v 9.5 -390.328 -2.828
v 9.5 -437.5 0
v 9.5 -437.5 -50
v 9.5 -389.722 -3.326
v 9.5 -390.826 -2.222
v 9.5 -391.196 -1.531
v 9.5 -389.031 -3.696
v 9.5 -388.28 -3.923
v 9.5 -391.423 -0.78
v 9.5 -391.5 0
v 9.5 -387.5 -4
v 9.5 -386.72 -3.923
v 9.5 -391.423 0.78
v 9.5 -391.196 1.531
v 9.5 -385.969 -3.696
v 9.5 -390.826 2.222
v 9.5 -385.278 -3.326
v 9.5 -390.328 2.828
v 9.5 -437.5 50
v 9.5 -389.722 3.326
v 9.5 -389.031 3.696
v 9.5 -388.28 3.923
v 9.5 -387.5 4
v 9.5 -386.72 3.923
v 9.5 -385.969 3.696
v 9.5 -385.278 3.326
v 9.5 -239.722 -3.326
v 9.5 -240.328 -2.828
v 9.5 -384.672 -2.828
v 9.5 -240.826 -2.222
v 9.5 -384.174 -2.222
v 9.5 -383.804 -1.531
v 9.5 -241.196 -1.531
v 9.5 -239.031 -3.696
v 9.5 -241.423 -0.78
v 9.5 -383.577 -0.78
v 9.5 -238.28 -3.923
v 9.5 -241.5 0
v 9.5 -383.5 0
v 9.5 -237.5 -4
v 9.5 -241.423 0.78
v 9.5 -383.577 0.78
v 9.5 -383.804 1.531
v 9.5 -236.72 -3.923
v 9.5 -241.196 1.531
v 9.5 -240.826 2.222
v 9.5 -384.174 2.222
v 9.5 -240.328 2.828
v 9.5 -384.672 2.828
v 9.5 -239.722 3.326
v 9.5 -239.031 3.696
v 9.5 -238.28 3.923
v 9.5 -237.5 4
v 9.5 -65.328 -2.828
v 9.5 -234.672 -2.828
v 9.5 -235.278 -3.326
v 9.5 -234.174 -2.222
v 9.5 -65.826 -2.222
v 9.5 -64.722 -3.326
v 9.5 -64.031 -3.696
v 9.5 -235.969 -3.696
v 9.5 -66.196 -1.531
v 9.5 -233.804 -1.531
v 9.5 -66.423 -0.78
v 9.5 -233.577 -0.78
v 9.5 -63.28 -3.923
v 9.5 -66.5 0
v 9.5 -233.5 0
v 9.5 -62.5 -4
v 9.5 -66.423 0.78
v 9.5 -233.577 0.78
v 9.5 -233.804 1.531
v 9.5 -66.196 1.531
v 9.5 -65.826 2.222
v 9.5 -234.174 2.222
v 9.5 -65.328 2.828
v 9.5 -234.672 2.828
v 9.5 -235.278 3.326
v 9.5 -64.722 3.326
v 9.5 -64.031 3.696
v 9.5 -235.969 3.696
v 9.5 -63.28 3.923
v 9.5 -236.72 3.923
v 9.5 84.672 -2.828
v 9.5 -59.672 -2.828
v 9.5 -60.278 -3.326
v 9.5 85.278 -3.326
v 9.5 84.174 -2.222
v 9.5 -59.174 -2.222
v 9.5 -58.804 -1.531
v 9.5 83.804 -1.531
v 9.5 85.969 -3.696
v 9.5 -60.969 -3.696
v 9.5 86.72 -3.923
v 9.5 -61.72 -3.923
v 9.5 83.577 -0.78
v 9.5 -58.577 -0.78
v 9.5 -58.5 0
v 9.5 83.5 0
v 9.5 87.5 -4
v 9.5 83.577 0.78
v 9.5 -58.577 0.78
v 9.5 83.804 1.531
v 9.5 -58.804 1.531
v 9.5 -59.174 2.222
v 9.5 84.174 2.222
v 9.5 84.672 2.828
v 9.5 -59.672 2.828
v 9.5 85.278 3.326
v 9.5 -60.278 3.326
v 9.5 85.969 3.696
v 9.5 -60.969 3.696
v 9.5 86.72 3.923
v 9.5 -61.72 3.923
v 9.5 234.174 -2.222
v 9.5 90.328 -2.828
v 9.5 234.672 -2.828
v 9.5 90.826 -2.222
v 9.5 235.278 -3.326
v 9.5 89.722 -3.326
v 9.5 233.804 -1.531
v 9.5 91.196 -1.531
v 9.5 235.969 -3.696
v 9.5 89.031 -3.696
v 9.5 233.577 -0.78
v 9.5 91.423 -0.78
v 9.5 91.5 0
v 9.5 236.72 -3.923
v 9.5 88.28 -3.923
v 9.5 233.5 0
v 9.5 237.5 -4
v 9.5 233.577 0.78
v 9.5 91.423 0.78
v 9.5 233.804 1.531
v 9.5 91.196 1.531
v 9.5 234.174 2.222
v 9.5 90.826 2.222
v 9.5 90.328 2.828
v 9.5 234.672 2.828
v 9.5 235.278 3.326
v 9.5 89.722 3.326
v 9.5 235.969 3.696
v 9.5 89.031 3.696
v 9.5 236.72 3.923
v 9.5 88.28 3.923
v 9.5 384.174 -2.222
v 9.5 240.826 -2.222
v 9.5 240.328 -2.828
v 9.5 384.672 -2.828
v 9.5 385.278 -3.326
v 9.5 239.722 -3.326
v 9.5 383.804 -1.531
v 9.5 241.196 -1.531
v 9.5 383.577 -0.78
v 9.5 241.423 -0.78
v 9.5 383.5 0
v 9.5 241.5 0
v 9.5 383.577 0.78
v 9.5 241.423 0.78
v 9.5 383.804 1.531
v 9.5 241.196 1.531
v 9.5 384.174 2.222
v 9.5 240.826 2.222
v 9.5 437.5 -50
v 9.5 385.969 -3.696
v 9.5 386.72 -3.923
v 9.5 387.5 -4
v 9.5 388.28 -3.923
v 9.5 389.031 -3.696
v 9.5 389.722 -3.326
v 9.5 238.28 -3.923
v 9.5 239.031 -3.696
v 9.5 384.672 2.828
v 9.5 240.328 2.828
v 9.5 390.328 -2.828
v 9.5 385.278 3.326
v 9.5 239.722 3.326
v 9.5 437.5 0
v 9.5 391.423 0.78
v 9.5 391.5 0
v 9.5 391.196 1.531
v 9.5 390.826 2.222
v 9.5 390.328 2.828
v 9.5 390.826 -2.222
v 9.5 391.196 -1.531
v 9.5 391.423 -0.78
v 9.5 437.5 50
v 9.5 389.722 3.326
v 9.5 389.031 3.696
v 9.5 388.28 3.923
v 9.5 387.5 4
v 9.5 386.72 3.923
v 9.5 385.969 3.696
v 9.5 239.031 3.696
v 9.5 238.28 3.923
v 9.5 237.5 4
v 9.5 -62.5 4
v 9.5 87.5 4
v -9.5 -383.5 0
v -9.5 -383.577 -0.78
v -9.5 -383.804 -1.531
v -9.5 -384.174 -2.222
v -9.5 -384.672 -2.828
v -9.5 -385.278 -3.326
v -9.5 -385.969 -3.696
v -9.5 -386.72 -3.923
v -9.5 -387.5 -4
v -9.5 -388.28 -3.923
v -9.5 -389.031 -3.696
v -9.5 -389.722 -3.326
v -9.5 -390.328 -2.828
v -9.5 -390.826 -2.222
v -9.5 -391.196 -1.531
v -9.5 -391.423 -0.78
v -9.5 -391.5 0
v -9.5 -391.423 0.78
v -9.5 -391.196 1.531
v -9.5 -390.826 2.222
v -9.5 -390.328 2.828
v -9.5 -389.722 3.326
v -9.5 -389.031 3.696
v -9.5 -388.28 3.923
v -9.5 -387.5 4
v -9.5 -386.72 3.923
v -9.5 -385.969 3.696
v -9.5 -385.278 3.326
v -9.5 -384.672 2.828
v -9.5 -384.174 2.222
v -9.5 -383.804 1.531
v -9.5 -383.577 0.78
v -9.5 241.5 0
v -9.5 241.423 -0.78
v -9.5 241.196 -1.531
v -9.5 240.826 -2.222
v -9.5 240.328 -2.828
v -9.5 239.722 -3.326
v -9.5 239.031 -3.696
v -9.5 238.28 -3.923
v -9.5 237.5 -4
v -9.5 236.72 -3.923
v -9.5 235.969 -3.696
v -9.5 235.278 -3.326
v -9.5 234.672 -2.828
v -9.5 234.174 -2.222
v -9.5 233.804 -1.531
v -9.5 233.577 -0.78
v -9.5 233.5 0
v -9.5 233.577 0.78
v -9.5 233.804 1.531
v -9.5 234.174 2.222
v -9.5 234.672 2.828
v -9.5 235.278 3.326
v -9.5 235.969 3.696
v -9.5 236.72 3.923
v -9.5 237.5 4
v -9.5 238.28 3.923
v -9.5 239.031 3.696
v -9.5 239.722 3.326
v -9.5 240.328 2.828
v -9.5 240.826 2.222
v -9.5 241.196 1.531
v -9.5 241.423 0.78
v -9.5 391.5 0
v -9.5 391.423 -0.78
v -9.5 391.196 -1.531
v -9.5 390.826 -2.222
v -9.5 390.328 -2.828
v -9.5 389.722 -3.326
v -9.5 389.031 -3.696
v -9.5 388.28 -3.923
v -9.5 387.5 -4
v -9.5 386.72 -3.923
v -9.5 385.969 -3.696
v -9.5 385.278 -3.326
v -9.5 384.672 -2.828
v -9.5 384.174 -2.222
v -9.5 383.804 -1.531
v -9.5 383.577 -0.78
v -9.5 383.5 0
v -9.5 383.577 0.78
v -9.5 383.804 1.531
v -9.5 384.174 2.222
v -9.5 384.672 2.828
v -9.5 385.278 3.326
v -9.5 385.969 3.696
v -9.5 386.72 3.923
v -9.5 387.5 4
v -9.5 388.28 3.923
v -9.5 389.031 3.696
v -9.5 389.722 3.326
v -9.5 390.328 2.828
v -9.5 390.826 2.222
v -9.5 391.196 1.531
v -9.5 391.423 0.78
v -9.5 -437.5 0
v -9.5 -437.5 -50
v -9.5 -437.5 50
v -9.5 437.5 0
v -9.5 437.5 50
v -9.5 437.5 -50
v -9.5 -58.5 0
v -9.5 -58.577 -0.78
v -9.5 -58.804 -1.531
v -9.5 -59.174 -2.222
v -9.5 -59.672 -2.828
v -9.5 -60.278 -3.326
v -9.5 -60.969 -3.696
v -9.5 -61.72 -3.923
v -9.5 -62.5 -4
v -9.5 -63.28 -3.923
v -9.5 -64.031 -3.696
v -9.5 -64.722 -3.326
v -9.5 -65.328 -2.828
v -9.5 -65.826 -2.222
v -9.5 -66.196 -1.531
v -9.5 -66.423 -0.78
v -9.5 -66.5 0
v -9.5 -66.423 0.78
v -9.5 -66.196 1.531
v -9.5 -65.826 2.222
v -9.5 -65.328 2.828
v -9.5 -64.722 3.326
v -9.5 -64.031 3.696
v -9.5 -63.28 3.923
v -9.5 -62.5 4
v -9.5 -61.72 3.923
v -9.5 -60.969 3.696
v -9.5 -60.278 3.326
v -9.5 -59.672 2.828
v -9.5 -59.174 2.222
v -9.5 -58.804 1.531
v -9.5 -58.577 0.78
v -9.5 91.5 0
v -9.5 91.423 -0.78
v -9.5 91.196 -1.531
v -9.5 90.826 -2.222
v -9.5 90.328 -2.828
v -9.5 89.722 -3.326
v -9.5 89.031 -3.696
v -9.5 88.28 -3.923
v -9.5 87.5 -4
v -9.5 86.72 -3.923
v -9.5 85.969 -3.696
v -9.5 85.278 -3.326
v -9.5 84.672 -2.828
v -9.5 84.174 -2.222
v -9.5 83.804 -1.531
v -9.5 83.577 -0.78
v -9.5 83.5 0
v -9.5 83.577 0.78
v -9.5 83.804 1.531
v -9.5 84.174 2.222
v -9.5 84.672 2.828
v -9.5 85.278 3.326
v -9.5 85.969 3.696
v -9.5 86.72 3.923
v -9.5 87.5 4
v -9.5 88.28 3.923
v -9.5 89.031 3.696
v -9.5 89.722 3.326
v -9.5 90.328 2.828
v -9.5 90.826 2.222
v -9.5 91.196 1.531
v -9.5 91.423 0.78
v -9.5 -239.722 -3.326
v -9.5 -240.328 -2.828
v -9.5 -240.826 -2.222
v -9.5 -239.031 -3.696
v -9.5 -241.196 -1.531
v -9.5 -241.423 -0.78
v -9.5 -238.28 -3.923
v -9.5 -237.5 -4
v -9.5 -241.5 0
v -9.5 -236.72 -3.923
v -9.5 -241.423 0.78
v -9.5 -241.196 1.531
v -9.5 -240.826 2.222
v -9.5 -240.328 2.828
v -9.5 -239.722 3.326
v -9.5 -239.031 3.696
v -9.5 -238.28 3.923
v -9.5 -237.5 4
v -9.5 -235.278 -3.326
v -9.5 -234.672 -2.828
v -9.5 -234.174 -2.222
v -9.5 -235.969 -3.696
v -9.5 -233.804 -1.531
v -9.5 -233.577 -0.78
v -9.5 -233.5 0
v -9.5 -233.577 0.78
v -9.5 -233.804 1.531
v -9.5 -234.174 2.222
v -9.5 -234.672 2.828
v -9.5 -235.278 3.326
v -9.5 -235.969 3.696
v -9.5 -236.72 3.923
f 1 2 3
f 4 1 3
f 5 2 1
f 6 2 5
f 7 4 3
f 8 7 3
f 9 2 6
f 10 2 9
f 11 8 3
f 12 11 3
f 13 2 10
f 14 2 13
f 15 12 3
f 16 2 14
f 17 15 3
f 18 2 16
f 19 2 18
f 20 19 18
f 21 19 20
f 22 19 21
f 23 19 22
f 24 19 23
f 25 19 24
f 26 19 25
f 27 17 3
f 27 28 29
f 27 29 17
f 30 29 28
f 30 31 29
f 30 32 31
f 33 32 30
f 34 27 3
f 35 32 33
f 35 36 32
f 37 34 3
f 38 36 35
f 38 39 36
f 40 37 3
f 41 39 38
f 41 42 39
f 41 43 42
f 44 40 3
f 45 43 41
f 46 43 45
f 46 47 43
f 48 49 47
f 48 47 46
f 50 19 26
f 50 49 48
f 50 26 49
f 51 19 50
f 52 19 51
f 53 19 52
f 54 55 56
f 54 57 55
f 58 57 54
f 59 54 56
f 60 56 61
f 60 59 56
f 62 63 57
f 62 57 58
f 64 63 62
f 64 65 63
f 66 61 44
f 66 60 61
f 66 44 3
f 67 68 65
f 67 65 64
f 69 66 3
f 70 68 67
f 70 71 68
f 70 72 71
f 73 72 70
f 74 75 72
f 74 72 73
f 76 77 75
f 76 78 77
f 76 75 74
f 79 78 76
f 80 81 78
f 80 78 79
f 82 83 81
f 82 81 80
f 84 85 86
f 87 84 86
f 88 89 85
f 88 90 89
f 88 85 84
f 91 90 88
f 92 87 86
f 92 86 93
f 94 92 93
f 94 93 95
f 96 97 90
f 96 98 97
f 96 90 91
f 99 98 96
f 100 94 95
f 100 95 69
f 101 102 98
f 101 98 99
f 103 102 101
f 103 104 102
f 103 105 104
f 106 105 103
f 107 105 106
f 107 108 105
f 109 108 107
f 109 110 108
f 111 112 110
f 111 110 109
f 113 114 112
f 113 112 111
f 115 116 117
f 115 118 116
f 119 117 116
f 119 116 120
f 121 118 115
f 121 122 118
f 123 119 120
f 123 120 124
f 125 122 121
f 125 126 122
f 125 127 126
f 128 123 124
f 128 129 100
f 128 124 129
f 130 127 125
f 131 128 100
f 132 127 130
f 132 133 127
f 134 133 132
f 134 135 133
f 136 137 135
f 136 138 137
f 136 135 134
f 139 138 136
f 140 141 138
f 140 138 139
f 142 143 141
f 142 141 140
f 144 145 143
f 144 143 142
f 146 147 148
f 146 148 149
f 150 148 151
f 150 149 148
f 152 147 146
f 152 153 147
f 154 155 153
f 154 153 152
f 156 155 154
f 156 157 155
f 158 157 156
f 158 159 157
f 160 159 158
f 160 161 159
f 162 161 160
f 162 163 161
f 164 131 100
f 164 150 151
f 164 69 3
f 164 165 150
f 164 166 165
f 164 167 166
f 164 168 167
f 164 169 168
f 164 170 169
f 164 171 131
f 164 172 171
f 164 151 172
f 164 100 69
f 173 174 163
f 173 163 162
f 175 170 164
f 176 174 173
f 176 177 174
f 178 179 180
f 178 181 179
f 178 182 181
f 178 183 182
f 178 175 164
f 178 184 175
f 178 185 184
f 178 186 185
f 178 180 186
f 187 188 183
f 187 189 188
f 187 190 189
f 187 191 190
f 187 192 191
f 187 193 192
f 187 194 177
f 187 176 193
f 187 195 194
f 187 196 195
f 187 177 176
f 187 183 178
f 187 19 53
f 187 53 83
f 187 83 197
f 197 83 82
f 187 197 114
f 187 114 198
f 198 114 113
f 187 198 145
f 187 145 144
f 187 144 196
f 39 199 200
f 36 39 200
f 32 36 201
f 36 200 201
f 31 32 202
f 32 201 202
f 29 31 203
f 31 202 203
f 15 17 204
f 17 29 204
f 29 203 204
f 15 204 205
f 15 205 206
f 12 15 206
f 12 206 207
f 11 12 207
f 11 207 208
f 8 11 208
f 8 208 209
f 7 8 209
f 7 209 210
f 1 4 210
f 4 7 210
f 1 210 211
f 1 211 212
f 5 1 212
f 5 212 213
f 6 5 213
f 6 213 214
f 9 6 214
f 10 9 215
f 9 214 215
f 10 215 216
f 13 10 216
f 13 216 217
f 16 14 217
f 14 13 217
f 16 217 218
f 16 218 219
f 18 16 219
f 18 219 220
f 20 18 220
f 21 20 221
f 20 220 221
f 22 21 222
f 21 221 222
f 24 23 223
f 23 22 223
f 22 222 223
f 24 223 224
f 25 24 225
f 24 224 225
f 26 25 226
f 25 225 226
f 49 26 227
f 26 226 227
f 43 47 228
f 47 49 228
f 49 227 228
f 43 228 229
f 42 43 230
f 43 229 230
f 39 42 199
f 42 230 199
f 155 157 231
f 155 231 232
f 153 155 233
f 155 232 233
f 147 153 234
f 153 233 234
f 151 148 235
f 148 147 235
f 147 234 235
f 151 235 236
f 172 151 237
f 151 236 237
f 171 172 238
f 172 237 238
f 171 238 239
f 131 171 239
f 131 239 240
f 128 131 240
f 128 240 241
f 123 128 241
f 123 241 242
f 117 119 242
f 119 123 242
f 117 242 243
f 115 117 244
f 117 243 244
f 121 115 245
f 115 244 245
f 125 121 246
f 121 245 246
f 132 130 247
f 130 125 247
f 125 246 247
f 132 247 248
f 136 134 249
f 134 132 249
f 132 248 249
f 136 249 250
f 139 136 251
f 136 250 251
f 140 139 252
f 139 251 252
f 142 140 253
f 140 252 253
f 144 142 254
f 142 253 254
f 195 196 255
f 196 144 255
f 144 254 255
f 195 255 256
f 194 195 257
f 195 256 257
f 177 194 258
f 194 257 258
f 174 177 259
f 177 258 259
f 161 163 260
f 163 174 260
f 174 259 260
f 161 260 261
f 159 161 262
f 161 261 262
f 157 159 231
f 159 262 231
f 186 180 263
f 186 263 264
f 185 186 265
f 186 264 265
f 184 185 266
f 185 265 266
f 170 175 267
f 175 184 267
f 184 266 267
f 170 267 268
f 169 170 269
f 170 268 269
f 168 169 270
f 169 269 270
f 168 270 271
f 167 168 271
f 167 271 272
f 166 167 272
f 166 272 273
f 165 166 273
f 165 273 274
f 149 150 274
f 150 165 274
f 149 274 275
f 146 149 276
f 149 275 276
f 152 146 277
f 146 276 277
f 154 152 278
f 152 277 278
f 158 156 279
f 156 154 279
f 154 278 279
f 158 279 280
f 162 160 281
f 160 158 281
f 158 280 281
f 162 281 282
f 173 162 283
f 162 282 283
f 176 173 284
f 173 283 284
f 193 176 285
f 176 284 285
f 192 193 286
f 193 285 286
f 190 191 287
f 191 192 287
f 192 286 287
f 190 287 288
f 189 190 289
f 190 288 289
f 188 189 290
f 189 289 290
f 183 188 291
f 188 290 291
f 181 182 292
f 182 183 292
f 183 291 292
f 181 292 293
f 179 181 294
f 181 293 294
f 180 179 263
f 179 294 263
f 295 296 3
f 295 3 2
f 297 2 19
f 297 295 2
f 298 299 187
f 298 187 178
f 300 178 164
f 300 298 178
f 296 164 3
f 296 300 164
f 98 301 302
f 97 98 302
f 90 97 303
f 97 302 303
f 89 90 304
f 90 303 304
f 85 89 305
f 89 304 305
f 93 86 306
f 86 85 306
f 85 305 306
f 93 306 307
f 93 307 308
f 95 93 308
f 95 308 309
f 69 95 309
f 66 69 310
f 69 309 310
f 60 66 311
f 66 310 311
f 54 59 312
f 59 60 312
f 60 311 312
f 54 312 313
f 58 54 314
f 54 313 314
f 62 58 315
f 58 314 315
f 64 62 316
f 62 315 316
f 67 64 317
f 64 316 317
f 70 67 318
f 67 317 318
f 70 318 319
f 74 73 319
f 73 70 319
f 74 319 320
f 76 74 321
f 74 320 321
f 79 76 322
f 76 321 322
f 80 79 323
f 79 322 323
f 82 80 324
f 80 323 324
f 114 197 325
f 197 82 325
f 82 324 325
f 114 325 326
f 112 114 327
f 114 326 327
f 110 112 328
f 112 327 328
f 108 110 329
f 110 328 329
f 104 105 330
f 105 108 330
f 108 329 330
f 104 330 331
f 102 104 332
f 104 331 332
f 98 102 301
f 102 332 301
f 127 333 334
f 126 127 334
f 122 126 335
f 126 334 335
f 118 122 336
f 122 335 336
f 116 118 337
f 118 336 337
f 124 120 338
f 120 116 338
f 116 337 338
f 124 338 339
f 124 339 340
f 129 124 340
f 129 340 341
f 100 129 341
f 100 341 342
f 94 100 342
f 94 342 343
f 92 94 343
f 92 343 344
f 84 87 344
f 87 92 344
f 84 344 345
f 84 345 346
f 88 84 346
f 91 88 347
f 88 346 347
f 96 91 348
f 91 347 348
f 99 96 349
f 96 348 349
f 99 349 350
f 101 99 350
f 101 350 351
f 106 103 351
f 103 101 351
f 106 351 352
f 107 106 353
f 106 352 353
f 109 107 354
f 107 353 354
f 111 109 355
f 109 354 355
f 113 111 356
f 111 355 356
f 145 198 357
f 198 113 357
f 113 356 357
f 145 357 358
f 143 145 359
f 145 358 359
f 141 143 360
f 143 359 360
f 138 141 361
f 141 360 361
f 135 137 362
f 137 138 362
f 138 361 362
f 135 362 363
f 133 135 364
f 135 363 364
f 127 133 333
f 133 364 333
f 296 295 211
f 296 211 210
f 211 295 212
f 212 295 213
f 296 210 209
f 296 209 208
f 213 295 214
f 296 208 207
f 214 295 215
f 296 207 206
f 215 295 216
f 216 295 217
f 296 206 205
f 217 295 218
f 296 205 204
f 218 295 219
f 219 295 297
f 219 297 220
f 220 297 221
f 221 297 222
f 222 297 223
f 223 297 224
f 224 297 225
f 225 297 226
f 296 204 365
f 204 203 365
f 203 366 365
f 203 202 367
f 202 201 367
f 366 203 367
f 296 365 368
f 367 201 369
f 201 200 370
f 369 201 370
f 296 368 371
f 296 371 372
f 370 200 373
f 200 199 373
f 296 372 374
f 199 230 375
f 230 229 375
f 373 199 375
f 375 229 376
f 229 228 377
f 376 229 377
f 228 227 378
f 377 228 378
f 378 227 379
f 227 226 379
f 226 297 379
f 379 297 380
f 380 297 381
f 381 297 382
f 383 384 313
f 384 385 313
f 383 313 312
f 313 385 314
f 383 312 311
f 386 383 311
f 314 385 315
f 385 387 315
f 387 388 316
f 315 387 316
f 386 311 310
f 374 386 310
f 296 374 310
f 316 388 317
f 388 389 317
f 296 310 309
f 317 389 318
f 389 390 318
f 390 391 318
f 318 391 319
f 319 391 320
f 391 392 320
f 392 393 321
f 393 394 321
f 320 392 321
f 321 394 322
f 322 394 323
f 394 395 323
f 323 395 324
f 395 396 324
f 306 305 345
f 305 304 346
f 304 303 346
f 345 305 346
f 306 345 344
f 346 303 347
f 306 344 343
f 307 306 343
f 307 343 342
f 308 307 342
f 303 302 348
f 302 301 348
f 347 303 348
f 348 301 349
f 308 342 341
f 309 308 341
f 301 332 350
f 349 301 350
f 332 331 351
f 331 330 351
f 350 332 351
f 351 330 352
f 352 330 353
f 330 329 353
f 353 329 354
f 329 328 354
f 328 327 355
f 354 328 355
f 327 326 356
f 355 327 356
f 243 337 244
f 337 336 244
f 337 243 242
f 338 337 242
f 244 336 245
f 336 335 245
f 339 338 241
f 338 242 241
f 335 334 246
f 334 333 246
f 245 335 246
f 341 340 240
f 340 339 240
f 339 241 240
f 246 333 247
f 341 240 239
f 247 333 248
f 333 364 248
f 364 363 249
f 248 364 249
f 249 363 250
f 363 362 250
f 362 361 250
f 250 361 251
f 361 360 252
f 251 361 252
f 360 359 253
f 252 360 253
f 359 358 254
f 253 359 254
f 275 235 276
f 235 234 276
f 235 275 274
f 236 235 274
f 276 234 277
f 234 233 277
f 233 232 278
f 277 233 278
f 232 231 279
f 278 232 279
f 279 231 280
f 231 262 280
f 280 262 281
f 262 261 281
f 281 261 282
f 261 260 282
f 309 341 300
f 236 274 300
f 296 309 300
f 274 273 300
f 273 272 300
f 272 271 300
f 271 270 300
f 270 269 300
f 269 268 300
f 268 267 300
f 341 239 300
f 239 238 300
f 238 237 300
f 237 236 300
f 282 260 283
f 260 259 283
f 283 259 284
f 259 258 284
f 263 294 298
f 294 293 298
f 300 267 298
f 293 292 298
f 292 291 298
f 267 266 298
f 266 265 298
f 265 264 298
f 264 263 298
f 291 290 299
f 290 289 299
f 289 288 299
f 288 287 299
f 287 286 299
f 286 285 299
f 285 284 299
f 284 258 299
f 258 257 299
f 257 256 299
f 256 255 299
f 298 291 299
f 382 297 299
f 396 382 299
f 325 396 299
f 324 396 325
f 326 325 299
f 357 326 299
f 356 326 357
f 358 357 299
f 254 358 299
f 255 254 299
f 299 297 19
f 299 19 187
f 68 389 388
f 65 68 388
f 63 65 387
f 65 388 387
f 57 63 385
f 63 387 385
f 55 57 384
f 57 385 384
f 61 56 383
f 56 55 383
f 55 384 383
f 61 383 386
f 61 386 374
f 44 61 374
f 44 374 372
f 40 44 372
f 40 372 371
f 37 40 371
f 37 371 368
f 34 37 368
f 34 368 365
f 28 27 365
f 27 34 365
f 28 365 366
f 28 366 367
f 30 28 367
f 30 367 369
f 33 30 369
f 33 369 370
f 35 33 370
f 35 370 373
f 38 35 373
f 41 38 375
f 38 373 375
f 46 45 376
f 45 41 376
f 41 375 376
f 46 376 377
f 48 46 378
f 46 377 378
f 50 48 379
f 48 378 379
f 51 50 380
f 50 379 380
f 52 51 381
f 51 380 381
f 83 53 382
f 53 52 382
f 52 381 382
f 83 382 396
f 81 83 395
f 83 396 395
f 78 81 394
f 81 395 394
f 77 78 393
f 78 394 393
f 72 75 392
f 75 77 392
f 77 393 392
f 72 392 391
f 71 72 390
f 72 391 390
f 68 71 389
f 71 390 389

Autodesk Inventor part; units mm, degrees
ref_plane "YZ Plane" through (0, 0, 0) normal (1, 0, 0) x (0, 1, 0)
ref_plane "XZ Plane" through (0, 0, 0) normal (0, 1, 0) x (-1, 0, 0)
ref_plane "XY Plane" through (0, 0, 0) normal (0, 0, 1) x (1, 0, 0)
sketch "Sketch2" plane through (0, 0, 0) normal (1, 0, 0) x (0, 1, 0)
  line L0 (437.5, -50) -> (-437.5, -50)
  line L1 (-437.5, -50) -> (-437.5, 50)
  line L2 (-437.5, 50) -> (437.5, 50)
  line L3 (437.5, 50) -> (437.5, -50)
  line L4 (437.5, 0) -> (387.5, 0)
  line L5 (87.5, 0) -> (-62.5, 0)
  line L6 (-62.5, 0) -> (-237.5, 0)
  line L7 (-237.5, 0) -> (-387.5, 0)
  line L8 (-387.5, 0) -> (-437.5, 0)
  circle A0 centre (387.5, 0) radius 4
  circle A1 centre (237.5, 0) radius 4
  circle A2 centre (87.5, 0) radius 4
  circle A3 centre (-62.5, 0) radius 4
  circle A4 centre (-237.5, 0) radius 4
  circle A5 centre (-387.5, 0) radius 4
  point P0 (0, 0)
  dimension "d0" = 875
  dimension "d1" = 100
  dimension "d9" = 8
  dimension "d10" = 8
  dimension "d11" = 8
  dimension "d12" = 8
  dimension "d13" = 8
  dimension "d14" = 8
  dimension "d15" = 150
  dimension "d16" = 50
  dimension "d17" = 150
  dimension "d18" = 150
  dimension "d19" = 175
  dimension "d20" = 150
  dimension "d21" = 50
extrude "Extrusion1" add sketch "Sketch2" along normal mid plane 19
properties part number "I"
